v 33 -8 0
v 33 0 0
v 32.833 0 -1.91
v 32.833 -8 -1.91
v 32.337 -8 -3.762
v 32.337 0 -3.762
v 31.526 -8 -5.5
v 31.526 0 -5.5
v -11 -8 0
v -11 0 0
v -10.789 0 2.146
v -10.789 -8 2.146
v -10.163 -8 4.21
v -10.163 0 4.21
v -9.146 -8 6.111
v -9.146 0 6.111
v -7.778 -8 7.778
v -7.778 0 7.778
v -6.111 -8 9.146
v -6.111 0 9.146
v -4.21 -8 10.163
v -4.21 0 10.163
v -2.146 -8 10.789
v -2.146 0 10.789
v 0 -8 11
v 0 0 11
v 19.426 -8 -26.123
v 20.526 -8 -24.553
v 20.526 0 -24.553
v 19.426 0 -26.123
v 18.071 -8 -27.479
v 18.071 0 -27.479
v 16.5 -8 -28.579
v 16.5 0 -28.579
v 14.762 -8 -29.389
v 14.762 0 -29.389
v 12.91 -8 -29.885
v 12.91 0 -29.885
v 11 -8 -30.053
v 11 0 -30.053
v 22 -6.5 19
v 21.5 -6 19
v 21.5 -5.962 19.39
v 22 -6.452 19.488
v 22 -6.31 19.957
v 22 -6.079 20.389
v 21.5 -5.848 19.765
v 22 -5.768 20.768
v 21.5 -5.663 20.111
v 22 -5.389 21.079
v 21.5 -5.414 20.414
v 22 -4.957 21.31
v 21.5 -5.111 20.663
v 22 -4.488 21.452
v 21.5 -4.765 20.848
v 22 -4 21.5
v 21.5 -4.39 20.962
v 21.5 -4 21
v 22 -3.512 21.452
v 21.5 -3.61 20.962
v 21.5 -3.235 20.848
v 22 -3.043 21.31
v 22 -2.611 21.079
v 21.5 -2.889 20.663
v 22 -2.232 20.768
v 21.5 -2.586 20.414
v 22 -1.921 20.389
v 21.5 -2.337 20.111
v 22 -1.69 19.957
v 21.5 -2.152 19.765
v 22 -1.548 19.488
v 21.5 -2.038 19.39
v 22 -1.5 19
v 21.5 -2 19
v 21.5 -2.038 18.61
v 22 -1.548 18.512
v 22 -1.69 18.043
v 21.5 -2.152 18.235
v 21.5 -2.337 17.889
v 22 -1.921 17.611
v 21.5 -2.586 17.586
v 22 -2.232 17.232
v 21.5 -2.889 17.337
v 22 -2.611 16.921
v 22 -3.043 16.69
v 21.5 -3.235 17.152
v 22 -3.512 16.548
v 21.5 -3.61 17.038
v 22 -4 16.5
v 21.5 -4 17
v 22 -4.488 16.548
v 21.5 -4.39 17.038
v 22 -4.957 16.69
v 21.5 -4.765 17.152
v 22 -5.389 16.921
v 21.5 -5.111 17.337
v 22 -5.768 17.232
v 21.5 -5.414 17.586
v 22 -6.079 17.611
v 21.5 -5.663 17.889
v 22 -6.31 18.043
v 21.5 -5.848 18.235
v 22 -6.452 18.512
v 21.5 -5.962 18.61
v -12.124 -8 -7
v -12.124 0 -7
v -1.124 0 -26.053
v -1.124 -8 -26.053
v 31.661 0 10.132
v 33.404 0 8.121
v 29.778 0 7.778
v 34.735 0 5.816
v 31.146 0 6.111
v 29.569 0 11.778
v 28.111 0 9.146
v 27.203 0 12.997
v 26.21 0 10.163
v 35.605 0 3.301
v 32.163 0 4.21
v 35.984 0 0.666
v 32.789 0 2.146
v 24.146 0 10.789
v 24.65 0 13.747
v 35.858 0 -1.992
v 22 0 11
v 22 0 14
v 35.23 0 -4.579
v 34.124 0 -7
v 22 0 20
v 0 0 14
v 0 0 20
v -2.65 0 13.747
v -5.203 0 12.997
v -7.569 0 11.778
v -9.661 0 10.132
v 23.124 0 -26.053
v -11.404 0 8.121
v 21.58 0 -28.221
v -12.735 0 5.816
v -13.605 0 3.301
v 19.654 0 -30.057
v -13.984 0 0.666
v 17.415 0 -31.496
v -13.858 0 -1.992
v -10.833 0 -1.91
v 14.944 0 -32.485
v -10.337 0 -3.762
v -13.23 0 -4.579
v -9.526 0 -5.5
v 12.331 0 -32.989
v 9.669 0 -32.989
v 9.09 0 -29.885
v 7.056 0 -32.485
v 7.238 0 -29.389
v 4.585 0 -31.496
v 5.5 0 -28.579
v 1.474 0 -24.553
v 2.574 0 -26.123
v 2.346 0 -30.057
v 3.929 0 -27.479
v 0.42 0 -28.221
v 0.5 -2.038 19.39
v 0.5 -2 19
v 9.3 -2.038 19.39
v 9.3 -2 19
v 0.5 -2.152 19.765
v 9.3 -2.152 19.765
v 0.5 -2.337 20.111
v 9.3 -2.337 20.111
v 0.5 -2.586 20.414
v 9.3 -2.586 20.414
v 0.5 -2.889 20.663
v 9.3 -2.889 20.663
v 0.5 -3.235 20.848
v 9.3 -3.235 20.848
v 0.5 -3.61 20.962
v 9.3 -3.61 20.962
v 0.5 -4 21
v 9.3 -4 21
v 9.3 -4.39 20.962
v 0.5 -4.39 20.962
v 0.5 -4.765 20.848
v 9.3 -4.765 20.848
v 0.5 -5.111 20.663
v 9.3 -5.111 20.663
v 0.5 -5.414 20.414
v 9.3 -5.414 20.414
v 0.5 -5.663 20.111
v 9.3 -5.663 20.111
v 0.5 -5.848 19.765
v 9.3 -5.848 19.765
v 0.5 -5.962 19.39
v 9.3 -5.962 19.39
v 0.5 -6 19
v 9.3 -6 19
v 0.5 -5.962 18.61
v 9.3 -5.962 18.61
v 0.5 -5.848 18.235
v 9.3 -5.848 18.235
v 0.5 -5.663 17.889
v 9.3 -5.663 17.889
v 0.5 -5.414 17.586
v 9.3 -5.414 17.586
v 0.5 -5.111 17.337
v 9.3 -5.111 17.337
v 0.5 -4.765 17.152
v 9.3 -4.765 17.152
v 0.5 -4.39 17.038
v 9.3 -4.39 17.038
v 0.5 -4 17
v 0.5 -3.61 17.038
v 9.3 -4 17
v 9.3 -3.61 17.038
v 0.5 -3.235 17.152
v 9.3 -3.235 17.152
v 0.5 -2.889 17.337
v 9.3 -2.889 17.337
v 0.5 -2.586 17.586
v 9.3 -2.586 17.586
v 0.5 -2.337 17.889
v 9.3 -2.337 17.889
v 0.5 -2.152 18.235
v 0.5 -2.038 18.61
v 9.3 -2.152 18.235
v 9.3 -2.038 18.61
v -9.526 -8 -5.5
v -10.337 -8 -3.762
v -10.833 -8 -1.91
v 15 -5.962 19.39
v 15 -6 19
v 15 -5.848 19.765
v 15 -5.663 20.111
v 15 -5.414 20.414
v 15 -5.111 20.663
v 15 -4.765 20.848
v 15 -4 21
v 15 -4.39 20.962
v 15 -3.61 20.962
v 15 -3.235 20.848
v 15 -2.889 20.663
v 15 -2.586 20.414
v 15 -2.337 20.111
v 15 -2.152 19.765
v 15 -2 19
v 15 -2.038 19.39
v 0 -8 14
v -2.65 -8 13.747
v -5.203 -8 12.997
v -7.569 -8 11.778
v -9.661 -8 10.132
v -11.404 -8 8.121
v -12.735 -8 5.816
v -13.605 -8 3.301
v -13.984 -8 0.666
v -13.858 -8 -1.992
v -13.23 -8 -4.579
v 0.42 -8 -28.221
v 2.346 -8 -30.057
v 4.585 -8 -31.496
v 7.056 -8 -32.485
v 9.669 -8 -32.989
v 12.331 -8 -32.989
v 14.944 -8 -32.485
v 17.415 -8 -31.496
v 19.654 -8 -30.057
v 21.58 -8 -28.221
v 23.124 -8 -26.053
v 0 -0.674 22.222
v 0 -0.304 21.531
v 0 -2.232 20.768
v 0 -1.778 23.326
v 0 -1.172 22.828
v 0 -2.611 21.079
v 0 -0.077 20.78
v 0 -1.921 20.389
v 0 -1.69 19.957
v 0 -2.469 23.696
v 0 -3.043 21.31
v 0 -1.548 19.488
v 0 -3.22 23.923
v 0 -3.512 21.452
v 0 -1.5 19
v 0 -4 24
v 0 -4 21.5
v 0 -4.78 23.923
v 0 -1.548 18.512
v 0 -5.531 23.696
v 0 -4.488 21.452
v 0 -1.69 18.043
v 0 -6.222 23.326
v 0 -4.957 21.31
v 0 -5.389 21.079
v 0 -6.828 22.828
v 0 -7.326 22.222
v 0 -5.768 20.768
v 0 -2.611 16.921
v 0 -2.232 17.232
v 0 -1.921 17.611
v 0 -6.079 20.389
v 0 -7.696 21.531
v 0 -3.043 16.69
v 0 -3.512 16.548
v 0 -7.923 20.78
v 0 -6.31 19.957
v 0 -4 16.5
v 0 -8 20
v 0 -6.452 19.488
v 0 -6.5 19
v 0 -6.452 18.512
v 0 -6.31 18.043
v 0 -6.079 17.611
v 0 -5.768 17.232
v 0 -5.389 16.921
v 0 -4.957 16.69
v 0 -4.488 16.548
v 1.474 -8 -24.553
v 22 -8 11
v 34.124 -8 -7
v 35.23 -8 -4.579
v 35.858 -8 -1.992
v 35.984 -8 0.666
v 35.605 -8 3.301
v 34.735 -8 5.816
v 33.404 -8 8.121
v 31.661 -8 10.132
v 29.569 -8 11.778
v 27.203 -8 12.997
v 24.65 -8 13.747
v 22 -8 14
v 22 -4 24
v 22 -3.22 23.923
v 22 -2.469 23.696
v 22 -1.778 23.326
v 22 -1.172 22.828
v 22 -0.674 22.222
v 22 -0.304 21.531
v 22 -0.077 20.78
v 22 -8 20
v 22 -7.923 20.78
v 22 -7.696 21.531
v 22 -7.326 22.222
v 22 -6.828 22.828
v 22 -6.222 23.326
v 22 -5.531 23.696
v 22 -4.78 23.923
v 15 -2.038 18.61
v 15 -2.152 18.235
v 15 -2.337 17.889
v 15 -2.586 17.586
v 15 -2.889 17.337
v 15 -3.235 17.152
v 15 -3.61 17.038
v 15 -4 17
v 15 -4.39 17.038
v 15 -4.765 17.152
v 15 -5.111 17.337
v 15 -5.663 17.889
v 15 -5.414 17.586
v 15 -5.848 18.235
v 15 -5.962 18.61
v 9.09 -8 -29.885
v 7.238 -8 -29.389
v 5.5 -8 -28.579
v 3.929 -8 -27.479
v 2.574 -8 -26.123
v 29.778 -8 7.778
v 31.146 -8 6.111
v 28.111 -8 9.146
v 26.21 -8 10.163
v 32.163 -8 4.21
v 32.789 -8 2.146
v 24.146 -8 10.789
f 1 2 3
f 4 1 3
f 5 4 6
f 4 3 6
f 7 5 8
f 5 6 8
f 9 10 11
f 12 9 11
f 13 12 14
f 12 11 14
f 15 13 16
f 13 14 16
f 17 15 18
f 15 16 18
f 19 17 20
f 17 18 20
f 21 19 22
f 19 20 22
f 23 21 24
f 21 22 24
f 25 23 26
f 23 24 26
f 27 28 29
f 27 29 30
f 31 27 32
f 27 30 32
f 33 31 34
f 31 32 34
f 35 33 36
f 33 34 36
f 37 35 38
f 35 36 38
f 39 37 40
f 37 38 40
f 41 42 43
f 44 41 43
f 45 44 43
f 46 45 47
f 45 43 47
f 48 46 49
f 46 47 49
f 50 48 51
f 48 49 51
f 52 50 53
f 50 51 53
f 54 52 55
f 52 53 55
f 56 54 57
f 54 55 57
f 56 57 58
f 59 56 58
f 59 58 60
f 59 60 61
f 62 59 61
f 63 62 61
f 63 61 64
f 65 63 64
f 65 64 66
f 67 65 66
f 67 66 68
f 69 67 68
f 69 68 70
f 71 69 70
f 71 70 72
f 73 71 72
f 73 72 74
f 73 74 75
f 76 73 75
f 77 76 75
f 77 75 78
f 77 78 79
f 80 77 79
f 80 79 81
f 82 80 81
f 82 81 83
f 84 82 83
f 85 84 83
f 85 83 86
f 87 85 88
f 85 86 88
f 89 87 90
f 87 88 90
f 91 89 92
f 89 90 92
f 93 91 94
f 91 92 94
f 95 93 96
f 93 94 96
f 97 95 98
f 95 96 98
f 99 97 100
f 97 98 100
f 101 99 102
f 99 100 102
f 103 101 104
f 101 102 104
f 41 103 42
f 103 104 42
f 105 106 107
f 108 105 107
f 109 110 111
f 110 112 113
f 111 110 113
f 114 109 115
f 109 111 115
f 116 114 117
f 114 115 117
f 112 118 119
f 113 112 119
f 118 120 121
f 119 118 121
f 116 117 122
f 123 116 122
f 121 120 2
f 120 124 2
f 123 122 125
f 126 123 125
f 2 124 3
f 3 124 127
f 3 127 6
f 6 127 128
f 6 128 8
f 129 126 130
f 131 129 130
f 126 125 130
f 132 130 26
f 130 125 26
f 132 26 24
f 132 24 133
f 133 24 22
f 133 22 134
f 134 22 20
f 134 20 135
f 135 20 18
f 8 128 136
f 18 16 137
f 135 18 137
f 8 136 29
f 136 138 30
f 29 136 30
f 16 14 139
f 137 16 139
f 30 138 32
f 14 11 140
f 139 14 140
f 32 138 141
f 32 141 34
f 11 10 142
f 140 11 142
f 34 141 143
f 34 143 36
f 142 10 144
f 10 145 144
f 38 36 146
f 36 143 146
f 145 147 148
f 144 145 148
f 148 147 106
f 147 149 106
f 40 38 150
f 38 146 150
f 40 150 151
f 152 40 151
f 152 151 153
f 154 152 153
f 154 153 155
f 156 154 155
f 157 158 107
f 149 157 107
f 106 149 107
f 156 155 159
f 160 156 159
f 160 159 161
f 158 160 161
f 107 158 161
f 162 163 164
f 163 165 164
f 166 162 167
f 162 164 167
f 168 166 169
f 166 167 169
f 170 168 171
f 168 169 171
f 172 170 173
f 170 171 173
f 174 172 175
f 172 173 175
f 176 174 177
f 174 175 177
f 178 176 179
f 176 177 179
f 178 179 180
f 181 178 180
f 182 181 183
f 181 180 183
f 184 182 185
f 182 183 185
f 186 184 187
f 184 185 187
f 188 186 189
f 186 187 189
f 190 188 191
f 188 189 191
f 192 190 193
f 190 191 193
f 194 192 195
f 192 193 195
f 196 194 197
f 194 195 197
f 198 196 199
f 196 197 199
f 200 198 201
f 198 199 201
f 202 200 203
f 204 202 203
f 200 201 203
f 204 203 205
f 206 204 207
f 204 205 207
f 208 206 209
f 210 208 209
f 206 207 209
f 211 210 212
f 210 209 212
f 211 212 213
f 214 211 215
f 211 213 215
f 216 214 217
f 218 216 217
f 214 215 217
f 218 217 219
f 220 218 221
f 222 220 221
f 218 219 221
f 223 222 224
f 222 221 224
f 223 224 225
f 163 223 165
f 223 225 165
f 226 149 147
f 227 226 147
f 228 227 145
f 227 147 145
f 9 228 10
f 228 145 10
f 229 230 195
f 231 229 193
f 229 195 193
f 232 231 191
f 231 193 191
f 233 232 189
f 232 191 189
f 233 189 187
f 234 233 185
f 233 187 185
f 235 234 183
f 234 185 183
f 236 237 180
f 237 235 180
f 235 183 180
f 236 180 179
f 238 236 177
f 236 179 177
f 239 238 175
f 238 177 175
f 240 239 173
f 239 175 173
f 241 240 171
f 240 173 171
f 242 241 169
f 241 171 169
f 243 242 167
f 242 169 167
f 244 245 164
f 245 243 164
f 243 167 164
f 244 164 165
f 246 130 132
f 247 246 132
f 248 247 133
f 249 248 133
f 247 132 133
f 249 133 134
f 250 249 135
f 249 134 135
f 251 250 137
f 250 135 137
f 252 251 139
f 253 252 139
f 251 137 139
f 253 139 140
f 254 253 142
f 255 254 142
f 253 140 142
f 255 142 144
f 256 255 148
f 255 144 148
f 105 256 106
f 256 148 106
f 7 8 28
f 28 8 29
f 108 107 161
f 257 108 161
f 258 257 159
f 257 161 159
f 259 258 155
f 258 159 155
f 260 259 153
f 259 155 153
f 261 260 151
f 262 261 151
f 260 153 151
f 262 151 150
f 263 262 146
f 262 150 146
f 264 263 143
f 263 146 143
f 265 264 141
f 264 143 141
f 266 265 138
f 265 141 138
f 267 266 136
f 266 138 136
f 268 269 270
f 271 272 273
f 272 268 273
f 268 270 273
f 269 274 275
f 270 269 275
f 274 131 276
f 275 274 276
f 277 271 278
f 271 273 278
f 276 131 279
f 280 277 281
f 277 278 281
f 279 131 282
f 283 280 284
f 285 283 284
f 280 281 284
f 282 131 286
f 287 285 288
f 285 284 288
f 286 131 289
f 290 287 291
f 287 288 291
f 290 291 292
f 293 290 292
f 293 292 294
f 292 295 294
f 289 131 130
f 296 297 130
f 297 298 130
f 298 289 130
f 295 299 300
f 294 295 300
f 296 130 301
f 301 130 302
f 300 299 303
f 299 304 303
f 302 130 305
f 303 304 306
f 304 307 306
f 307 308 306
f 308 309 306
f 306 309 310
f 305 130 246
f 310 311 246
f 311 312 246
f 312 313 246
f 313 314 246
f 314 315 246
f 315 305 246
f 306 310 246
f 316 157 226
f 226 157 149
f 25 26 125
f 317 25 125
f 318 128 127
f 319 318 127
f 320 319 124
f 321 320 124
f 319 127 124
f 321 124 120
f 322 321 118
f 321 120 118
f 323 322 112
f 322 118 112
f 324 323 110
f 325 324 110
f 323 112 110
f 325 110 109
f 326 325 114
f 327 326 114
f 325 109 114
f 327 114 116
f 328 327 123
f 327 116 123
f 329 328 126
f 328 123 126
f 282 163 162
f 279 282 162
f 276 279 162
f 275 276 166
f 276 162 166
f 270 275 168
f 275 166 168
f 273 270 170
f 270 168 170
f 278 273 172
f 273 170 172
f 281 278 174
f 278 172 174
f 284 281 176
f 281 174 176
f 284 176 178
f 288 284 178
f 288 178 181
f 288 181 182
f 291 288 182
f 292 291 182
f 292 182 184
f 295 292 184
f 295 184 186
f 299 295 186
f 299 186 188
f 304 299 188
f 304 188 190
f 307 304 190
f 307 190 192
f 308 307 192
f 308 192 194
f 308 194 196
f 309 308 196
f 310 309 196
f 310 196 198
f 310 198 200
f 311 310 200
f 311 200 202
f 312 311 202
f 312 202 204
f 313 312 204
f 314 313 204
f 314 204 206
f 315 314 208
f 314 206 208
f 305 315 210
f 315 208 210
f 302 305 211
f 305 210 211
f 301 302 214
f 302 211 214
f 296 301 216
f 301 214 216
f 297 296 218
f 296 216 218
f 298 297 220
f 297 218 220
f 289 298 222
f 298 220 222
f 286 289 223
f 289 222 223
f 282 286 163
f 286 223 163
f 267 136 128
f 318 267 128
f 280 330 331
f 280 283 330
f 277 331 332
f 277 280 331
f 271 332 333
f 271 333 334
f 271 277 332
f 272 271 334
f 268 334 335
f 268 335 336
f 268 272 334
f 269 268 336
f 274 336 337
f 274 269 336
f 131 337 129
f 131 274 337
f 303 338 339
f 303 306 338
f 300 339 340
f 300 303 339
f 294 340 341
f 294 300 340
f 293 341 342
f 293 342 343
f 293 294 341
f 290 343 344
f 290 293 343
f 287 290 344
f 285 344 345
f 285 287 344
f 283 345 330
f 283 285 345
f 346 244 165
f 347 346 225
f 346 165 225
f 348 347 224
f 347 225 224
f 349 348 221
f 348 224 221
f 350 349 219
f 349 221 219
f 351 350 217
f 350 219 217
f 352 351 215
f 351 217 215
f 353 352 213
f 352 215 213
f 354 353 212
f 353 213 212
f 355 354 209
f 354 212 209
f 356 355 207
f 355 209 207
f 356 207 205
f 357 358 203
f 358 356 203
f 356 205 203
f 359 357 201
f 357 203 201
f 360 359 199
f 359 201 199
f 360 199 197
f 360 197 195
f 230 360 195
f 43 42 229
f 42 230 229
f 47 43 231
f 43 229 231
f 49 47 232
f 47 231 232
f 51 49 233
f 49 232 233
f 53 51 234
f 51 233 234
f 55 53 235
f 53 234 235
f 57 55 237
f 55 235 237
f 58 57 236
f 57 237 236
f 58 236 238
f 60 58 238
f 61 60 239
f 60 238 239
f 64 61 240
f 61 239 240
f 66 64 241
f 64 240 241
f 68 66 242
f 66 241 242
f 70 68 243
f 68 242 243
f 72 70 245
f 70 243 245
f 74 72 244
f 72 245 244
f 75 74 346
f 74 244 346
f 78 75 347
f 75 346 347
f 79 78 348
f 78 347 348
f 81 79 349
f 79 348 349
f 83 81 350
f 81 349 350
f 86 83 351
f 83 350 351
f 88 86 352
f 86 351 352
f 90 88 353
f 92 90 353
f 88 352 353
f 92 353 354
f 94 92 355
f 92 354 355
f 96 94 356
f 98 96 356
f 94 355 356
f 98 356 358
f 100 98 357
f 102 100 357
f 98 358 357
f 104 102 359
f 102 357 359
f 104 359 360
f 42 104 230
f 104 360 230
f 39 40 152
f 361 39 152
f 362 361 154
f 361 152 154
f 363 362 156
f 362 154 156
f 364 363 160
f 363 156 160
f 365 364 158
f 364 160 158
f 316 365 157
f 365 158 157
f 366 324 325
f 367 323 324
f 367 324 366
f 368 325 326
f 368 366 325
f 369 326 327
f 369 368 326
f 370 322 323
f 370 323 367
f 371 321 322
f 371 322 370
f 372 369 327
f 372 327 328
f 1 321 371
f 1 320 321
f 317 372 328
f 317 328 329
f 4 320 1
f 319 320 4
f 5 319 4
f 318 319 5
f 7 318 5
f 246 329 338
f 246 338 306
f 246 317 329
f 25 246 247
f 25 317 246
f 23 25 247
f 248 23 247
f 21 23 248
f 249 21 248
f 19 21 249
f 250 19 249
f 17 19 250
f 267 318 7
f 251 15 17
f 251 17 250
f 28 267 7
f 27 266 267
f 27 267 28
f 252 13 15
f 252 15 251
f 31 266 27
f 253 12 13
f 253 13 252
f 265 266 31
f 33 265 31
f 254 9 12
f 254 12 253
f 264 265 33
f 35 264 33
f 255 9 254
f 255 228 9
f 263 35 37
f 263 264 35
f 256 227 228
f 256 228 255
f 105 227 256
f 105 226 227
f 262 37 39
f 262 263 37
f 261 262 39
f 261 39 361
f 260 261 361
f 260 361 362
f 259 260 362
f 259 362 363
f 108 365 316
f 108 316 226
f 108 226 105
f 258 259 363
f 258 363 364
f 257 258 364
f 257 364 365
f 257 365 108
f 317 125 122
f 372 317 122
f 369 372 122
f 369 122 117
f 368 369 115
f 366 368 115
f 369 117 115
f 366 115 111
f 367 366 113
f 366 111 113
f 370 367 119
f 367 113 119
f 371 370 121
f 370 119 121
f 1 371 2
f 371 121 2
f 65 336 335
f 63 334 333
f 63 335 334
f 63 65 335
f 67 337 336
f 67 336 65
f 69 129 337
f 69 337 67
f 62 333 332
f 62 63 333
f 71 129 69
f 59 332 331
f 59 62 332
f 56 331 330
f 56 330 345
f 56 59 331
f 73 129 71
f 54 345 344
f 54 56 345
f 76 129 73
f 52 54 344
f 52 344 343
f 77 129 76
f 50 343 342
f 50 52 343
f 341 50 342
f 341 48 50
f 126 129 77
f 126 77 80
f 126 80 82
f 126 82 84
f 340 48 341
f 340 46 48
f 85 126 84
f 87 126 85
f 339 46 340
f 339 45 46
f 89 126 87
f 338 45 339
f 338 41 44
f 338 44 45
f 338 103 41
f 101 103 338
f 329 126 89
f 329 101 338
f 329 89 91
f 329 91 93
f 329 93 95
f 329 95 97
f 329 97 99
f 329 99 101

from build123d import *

# Parameters (mm, degrees)
F1_DEPTH       = 8
F2_DEPTH       = 10
F5_D           = 4
F5_DEPTH       = 12.7
F5_CSINK_D     = 5
F5_CSINK_ANGLE = 90
F5_TIP         = 1.2017212381
F6_D           = 4
F6_DEPTH       = 15
F6_CSINK_D     = 5
F6_CSINK_ANGLE = 90
F6_TIP         = 1.2017212381
F7_R           = 3.99999


# Not quite as in the source:
# - a fillet or chamfer is up to 0.001 mm smaller than in the source, because OpenCascade refuses the exact size


with BuildPart() as f1:
    # F0 (on Front) → F1 (new body)
    with BuildSketch(Plane.XZ):
        with BuildLine():
            ThreePointArc((0, 14), (-12.124355653, 7), (-12.124355653, -7))
            Line((-12.124355653, -7), (-1.124355653, -26.0525588833))
            ThreePointArc((-1.124355653, -26.0525588833), (11, -33.0525588833), (23.124355653, -26.0525588833))
            Line((23.124355653, -26.0525588833), (34.124355653, -7))
            ThreePointArc((34.124355653, -7), (34.124355653, 7), (22, 14))
            Line((22, 14), (0, 14))
        make_face()
        with BuildLine():
            ThreePointArc((-11, 0), (-7.7781745931, 7.7781745931), (0, 11))
            Line((0, 11), (11, 11))
            Line((11, 11), (22, 11))
            ThreePointArc((22, 11), (29.7781745931, 7.7781745931), (33, 0))
            ThreePointArc((33, 0), (32.6251840892, -2.8470094961), (31.5262794416, -5.5))
            Line((31.5262794416, -5.5), (20.5262794416, -24.5525588833))
            ThreePointArc((20.5262794416, -24.5525588833), (16.5, -28.5788383249), (11, -30.0525588833))
            ThreePointArc((11, -30.0525588833), (5.5, -28.5788383249), (1.4737205584, -24.5525588833))
            Line((1.4737205584, -24.5525588833), (-9.5262794416, -5.5))
            ThreePointArc((-9.5262794416, -5.5), (-10.6251840892, -2.8470094961), (-11, 0))
        make_face(mode=Mode.SUBTRACT)
    extrude(amount=F1_DEPTH)

    # F2 (add): a face of the model
    f2_faces = [f1.faces().sort_by_distance(p)[0] for p in [
        (11, -4, 14),
    ]]
    extrude(f2_faces, amount=F2_DEPTH)

    # F5
    with Locations(Plane.YZ.offset(22)):
        with Locations((-4, 19)):
            CounterSinkHole(F5_D / 2, F5_CSINK_D / 2, depth=F5_DEPTH, counter_sink_angle=F5_CSINK_ANGLE)
            with Locations((0, 0, -(F5_DEPTH + F5_TIP / 2))):  # 118° drill point
                Cone(0, F5_D / 2, F5_TIP, mode=Mode.SUBTRACT)

    # F6
    with Locations(Plane(origin=(0, 0, 0), x_dir=(0, -1, 0), z_dir=(-1, 0, 0))):
        with Locations((4, 19)):
            CounterSinkHole(F6_D / 2, F6_CSINK_D / 2, depth=F6_DEPTH, counter_sink_angle=F6_CSINK_ANGLE)
            with Locations((0, 0, -(F6_DEPTH + F6_TIP / 2))):  # 118° drill point
                Cone(0, F6_D / 2, F6_TIP, mode=Mode.SUBTRACT)

    # F7 (radius 4 in the source; OpenCascade refuses exactly that, so slightly less here)
    f7_edges = [f1.edges().sort_by_distance(p)[0] for p in [
        (11, 0, 24),
        (11, -8, 24),
    ]]
    fillet(f7_edges, radius=F7_R)


solid = f1.part
